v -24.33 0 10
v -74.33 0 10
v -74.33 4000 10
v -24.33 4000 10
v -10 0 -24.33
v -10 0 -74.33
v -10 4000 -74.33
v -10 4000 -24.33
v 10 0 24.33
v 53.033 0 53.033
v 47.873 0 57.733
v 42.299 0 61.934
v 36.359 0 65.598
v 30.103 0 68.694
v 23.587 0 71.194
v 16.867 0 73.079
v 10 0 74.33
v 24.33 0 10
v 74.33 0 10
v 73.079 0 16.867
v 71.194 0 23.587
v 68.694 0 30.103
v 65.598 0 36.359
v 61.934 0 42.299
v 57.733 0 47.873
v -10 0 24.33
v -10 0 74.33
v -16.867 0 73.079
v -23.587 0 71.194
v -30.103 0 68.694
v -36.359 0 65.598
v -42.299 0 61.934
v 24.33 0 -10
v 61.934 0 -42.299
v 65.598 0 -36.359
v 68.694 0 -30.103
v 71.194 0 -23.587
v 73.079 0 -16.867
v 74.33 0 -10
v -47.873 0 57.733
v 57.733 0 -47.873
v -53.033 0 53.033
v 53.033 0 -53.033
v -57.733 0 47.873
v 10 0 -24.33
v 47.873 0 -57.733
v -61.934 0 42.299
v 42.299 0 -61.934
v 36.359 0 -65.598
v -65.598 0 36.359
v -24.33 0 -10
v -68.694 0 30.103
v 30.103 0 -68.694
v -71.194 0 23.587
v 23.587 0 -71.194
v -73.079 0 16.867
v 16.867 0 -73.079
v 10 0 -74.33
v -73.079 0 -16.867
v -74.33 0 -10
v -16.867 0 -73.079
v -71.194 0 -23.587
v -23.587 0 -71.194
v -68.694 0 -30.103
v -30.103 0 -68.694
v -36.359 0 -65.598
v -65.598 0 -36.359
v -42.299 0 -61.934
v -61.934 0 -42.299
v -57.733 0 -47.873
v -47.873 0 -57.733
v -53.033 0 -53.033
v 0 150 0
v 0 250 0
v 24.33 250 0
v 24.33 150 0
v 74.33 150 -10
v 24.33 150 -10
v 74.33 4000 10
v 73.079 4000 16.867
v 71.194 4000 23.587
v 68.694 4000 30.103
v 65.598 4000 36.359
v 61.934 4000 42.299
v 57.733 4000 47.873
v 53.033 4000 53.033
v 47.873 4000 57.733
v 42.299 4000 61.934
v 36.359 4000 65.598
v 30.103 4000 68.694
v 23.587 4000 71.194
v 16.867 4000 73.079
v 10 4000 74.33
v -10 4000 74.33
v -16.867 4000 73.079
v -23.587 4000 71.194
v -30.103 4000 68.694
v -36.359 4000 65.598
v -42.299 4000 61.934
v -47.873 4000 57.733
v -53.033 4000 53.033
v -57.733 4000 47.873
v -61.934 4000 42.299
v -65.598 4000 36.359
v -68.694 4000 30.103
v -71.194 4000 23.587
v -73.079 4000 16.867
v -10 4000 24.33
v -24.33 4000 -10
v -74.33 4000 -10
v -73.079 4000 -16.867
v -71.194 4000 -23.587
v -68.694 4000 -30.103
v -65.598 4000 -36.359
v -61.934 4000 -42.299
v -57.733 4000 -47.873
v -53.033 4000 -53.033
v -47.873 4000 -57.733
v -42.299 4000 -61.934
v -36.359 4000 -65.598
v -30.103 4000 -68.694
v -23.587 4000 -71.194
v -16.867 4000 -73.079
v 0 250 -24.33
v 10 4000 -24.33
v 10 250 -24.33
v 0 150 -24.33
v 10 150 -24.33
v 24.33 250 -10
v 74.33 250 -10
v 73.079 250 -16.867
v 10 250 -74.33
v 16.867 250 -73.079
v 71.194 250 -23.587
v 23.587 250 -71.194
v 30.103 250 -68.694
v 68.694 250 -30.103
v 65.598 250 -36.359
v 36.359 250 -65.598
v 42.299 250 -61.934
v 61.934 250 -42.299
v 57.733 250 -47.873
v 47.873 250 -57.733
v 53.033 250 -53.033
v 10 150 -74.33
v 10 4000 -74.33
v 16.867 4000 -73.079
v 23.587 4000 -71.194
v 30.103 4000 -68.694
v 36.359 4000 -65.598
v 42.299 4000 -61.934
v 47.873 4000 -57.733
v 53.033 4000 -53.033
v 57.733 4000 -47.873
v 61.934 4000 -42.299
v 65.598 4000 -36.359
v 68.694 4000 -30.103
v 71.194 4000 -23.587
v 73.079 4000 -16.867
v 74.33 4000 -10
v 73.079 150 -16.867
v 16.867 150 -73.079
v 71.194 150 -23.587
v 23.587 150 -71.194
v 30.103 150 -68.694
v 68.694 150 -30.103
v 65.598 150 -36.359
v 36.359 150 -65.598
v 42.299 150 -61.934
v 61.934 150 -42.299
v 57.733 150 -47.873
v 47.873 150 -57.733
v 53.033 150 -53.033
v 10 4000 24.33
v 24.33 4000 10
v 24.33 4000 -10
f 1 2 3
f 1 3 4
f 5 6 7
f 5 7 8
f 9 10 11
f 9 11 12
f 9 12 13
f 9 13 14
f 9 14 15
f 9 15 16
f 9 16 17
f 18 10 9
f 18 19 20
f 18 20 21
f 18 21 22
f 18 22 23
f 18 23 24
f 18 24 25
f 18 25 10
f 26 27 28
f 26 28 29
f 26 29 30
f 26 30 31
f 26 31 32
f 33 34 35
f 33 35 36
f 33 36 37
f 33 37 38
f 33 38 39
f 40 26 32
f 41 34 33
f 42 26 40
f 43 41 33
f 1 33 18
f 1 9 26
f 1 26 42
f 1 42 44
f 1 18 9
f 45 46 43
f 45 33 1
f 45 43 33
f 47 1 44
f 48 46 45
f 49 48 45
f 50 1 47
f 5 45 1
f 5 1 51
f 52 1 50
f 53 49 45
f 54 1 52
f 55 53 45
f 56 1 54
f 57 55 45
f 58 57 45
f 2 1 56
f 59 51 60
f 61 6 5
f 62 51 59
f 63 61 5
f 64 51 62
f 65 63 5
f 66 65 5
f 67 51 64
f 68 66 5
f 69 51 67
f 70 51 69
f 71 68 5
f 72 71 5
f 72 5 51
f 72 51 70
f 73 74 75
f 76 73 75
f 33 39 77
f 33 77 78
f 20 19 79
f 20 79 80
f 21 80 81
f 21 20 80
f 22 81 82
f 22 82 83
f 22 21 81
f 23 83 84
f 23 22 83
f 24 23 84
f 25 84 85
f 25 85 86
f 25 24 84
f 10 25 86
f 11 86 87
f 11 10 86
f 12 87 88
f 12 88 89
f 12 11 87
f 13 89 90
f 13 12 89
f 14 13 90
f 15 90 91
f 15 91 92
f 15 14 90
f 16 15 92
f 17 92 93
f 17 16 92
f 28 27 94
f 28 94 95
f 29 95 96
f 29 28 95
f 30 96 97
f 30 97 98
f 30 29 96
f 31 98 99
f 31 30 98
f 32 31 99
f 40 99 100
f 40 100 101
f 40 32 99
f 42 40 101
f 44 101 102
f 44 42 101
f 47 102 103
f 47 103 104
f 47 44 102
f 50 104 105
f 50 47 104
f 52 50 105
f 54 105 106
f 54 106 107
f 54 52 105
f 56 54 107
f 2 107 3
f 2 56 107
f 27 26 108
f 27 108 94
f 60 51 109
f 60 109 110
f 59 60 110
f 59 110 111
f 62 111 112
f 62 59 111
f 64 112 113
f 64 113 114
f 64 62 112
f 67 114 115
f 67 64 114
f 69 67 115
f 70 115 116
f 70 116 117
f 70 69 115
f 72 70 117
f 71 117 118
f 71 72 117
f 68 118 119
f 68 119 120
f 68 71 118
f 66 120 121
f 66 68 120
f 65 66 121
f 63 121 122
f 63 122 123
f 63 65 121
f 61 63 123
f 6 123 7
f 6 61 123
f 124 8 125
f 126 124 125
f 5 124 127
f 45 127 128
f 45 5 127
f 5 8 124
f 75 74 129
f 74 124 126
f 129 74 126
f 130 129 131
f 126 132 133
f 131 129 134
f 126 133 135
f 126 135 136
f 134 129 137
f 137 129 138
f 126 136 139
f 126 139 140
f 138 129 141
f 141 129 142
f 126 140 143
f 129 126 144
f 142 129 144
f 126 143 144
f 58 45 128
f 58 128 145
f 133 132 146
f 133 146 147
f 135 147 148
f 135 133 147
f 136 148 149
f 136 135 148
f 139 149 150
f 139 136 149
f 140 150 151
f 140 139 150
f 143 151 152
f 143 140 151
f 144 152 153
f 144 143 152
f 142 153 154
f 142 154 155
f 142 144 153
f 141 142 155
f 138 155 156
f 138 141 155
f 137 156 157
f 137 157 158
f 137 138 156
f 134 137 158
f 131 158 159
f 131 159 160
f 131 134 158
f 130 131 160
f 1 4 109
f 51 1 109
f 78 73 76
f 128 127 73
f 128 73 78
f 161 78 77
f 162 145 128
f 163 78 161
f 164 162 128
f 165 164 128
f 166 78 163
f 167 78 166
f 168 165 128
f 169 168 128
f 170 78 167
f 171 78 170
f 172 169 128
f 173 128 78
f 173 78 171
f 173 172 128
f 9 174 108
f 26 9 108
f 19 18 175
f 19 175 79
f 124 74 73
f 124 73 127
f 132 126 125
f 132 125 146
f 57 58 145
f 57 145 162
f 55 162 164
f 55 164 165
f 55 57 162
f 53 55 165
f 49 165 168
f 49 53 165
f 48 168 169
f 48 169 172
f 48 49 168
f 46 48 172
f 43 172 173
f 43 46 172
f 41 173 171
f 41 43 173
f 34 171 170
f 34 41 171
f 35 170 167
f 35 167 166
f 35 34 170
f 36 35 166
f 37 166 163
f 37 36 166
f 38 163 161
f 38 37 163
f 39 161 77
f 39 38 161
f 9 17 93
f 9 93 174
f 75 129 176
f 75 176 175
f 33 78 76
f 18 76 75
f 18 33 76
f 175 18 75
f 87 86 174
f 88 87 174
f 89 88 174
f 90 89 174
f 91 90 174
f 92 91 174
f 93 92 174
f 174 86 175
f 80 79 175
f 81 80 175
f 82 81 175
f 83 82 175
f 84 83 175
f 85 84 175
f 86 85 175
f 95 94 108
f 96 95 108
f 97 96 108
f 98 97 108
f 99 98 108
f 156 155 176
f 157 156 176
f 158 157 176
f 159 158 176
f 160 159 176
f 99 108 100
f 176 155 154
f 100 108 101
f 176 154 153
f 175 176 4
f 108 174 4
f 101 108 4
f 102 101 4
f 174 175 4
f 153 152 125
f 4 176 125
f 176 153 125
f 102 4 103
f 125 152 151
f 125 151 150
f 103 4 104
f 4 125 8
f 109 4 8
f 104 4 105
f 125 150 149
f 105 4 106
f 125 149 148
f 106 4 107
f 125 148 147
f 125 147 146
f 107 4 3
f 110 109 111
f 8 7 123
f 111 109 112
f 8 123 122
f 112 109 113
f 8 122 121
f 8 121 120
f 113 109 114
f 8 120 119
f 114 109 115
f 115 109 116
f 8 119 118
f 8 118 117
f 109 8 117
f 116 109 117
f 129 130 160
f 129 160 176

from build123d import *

# Parameters (mm, degrees)
BOSS_EXTRUDE2_DEPTH = 4000
CUT_EXTRUDE1_START  = 200
SKETCH2_W           = 74.330343737
SKETCH2_H           = 74.330343737
CUT_EXTRUDE1_DEPTH  = 50


with BuildPart() as part:
    # Sketch1 → Boss-Extrude2 (new body)
    with BuildSketch(Plane(origin=(0, 0, 0), x_dir=(1, 0, 0), z_dir=(0, 1, 0))):
        with BuildLine():
            Line((-10, 74.330343737), (-10, 24.330343737))
            Line((-10, 24.330343737), (10, 24.330343737))
            Line((10, 24.330343737), (10, 74.330343737))
            ThreePointArc((10, 74.330343737), (53.033008589, 53.033008589), (74.330343737, 10))
            Line((74.330343737, 10), (24.330343737, 10))
            Line((24.330343737, 10), (24.330343737, -10))
            Line((24.330343737, -10), (74.330343737, -10))
            ThreePointArc((74.330343737, -10), (53.033008589, -53.033008589), (10, -74.330343737))
            Line((10, -74.330343737), (10, -24.330343737))
            Line((10, -24.330343737), (-10, -24.330343737))
            Line((-10, -24.330343737), (-10, -74.330343737))
            ThreePointArc((-10, -74.330343737), (-53.033008589, -53.033008589), (-74.330343737, -10))
            Line((-74.330343737, -10), (-24.330343737, -10))
            Line((-24.330343737, -10), (-24.330343737, 10))
            Line((-24.330343737, 10), (-74.330343737, 10))
            ThreePointArc((-74.330343737, 10), (-53.033008589, 53.033008589), (-10, 74.330343737))
        make_face()
    extrude(amount=BOSS_EXTRUDE2_DEPTH)

    # Sketch2 → Cut-Extrude1 (cut, symmetric)
    with BuildSketch(Plane(origin=(0, 0, 0), x_dir=(1, 0, 0), z_dir=(0, 1, 0)).offset(CUT_EXTRUDE1_START)):
        with Locations((37.165171869, 37.165171869)):
            Rectangle(SKETCH2_W, SKETCH2_H)
    extrude(amount=CUT_EXTRUDE1_DEPTH, both=True, mode=Mode.SUBTRACT)


solid = part.part
